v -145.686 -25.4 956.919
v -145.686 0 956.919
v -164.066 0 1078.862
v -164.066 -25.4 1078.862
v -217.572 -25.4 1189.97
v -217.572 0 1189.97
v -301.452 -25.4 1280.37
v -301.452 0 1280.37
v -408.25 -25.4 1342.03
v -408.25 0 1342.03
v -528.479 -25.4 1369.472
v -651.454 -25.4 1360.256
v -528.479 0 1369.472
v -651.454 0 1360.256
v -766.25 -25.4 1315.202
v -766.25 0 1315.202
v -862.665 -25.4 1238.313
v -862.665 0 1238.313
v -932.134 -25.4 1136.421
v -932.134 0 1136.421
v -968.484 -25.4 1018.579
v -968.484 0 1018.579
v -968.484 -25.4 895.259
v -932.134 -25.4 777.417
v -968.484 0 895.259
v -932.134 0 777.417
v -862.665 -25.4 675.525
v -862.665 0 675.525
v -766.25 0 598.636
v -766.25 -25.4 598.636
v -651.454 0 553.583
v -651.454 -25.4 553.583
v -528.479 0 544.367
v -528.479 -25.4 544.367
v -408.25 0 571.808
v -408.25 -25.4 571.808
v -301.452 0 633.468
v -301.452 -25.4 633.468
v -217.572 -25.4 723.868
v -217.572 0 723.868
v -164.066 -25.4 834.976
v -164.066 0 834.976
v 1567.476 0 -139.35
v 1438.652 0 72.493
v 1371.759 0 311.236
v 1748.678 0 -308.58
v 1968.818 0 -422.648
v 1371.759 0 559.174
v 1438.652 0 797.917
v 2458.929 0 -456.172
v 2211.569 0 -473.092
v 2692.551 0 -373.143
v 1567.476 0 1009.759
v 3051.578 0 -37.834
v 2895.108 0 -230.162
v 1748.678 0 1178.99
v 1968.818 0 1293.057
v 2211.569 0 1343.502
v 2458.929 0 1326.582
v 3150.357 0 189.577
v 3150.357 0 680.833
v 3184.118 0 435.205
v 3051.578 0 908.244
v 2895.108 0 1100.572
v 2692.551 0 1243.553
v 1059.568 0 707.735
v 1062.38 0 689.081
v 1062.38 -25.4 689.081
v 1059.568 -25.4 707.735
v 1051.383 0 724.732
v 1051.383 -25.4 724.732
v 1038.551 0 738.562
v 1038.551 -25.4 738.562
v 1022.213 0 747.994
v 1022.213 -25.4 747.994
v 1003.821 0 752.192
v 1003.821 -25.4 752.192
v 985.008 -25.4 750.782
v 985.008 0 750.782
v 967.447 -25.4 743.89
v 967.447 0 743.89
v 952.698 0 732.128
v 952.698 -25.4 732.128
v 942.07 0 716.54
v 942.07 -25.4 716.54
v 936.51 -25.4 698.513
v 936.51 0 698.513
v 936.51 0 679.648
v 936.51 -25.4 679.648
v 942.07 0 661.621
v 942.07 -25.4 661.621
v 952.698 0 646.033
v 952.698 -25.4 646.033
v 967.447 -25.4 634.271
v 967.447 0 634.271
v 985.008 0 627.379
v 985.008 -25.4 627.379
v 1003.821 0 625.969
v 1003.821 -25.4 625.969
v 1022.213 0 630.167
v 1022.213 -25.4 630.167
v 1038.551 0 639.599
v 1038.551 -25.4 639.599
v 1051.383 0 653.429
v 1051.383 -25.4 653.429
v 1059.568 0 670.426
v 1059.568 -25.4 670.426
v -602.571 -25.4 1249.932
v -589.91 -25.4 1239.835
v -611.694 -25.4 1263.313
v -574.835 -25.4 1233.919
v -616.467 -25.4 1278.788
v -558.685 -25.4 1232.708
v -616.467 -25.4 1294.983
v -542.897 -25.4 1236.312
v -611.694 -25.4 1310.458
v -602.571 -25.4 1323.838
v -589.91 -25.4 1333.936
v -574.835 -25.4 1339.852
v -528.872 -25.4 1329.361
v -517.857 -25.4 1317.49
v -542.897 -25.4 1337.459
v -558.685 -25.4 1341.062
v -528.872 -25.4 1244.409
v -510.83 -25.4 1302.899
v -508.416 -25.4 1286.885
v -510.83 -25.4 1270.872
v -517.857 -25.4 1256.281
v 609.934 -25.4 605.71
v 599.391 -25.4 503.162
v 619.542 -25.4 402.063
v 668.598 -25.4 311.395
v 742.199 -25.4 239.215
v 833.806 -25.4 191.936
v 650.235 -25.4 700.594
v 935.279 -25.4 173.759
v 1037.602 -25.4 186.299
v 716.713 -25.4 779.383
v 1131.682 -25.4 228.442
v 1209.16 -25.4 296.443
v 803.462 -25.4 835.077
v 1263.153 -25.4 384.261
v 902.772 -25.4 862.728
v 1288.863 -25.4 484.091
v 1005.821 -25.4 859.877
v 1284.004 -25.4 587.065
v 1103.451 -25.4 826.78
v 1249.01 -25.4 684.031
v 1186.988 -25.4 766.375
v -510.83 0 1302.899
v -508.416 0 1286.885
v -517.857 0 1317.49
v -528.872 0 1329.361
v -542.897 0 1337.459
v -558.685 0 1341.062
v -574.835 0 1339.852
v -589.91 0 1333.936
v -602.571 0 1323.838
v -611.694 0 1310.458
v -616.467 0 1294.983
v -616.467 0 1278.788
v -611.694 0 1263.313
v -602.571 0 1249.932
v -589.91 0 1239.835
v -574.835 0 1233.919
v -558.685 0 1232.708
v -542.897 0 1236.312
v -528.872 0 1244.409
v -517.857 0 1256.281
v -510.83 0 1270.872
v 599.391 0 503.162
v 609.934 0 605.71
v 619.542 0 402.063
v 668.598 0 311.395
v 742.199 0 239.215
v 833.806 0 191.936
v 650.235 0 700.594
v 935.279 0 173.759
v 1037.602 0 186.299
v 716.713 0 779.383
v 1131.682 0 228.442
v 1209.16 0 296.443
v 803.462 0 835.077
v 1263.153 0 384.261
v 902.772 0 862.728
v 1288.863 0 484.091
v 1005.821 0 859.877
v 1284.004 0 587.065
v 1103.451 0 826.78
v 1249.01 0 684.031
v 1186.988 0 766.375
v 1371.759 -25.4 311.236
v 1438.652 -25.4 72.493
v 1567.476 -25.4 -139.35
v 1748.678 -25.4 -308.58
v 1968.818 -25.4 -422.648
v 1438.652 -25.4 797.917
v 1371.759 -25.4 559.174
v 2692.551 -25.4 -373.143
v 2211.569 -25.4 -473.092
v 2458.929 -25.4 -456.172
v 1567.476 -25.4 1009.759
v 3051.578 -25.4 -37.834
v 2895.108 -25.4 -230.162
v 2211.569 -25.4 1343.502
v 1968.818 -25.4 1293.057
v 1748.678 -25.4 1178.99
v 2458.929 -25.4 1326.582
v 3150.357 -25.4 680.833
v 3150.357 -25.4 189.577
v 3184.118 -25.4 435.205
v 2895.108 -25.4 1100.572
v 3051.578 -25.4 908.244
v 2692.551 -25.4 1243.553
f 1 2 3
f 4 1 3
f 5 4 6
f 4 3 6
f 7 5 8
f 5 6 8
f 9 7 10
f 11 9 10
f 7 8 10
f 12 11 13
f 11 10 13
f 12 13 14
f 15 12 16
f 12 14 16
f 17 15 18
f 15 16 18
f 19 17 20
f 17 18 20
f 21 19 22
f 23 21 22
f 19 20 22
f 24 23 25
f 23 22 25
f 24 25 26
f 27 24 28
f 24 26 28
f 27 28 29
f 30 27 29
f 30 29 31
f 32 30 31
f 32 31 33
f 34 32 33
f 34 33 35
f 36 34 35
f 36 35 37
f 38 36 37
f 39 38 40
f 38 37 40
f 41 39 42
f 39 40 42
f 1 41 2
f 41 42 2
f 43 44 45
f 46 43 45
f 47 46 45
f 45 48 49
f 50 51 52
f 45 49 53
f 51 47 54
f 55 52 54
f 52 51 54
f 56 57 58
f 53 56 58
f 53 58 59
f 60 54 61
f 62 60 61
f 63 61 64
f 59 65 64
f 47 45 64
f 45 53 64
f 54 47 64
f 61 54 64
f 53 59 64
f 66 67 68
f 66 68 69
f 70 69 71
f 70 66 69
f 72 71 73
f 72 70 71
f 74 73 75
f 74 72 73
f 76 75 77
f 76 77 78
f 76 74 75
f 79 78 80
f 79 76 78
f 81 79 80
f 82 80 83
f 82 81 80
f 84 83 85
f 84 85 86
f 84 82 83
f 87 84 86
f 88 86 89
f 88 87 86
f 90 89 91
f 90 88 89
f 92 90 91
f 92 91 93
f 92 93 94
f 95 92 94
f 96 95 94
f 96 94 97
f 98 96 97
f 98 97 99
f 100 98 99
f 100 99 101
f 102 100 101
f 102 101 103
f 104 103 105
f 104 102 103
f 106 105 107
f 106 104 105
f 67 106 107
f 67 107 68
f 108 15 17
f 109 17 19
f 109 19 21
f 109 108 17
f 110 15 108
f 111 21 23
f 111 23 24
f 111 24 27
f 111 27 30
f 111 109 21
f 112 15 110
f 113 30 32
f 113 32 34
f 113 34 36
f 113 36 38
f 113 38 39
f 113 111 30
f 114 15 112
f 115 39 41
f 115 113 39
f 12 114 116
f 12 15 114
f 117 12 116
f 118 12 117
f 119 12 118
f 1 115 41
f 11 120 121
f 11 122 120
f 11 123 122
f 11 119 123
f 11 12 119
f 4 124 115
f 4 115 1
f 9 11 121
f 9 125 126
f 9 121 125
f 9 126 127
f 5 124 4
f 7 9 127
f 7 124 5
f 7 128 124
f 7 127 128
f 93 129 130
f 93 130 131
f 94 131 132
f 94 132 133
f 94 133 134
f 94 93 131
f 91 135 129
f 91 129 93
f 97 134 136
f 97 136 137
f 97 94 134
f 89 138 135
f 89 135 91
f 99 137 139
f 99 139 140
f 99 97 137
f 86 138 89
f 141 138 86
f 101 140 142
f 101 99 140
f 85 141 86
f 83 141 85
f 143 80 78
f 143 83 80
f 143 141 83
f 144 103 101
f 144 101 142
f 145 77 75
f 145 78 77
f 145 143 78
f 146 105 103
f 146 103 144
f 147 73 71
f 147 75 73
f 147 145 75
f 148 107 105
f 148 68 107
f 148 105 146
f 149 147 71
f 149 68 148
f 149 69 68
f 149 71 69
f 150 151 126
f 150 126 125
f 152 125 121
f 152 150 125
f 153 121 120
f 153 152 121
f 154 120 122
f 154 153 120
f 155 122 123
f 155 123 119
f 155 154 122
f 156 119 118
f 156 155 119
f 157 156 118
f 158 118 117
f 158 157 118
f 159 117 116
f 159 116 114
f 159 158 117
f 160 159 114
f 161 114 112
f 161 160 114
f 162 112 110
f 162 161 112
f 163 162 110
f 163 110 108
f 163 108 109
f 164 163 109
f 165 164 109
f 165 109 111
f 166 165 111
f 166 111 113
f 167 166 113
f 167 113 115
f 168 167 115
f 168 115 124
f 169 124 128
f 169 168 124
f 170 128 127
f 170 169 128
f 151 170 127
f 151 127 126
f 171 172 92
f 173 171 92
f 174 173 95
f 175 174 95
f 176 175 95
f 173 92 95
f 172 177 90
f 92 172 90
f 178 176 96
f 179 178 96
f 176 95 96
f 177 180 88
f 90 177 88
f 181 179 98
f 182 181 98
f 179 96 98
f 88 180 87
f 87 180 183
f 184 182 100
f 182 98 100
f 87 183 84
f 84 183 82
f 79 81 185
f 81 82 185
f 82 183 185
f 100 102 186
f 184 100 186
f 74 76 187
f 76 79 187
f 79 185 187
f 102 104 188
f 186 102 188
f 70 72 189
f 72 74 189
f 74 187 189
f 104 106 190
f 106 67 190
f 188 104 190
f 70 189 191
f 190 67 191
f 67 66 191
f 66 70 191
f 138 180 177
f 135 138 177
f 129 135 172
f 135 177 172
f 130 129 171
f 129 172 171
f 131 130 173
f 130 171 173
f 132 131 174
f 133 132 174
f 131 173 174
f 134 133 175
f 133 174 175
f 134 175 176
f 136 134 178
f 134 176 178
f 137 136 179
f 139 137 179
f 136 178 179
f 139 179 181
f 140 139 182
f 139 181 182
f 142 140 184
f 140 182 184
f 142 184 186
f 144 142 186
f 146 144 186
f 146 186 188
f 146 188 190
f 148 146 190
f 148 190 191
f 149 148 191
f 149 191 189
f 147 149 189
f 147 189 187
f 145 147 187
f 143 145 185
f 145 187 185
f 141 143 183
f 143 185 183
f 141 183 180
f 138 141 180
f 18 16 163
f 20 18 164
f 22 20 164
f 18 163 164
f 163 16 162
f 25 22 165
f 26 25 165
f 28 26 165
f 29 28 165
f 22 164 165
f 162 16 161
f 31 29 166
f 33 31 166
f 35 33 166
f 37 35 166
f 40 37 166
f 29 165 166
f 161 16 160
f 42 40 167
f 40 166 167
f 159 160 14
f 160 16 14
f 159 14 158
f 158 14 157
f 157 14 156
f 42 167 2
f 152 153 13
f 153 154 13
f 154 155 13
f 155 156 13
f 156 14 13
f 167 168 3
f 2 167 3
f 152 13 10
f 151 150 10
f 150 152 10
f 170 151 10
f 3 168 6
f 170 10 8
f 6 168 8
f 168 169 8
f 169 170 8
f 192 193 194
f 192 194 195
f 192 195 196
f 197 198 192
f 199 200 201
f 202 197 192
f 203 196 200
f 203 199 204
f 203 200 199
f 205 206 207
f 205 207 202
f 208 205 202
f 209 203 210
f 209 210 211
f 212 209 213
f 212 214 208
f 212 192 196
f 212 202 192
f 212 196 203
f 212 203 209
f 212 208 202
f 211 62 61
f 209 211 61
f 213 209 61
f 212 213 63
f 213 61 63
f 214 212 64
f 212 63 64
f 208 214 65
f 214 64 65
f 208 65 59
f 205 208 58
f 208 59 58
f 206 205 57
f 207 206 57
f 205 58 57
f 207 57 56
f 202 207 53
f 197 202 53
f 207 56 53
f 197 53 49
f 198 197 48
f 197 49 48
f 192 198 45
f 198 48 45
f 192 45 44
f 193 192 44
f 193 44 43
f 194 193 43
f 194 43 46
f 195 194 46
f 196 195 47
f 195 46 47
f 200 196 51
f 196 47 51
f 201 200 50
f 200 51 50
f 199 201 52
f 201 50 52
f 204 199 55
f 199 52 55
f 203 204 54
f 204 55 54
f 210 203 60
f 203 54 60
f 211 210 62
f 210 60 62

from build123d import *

# Parameters (mm, degrees)
F0_R     = 413.7092458342
F0_R_2   = 54.3288686765
F1_DEPTH = 25.4
F0_R_3   = 63.2886539818
F0_R_4   = 910.4191534827


with BuildPart() as f1:
    # F0 (on Front) → F1 (new body)
    with BuildSketch(Plane.XZ):
        with Locations((-559.3950748444, 956.9191932678)):
            Circle(F0_R)
        with Locations((-562.7452135086, 1286.8853807449)):
            Circle(F0_R_2, mode=Mode.SUBTRACT)
    extrude(amount=F1_DEPTH)


with BuildPart() as f1b:
    # F0 (on Front) → F1, piece 2 (new body)
    with BuildSketch(Plane.XZ):
        with BuildLine():
            ThreePointArc((716.7133694164, 779.3830861909), (802.1753486044, 204.4245754364), (1290.6760317576, 519.461274147))
            ThreePointArc((1290.6760317576, 519.461274147), (1087.5071827524, 834.4979728577), (716.7133694164, 779.3830861909))
        make_face()
        with BuildLine():
            ThreePointArc((822.7081145061, 731.3828468323), (732.495792956, 673.2044381115), (716.7133694164, 779.3830861909))
            ThreePointArc((716.7133694164, 779.3830861909), (785.188547521, 789.561255553), (822.7081145061, 731.3828468323))
        make_face(mode=Mode.SUBTRACT)
        with Locations((999.0915060043, 689.0805363655)):
            Circle(F0_R_3, mode=Mode.SUBTRACT)
        with BuildLine():
            ThreePointArc((822.7081145061, 731.3828468323), (785.188547521, 789.561255553), (716.7133694164, 779.3830861909))
            ThreePointArc((716.7133694164, 779.3830861909), (732.495792956, 673.2044381115), (822.7081145061, 731.3828468323))
        make_face()
    extrude(amount=F1_DEPTH)


with BuildPart() as f1c:
    # F0 (on Front) → F1, piece 3 (new body)
    with BuildSketch(Plane.XZ):
        with Locations((2273.6985683441, 435.2048635483)):
            Circle(F0_R_4)
    extrude(amount=F1_DEPTH)


solid = Compound([f1.part, f1b.part, f1c.part])
